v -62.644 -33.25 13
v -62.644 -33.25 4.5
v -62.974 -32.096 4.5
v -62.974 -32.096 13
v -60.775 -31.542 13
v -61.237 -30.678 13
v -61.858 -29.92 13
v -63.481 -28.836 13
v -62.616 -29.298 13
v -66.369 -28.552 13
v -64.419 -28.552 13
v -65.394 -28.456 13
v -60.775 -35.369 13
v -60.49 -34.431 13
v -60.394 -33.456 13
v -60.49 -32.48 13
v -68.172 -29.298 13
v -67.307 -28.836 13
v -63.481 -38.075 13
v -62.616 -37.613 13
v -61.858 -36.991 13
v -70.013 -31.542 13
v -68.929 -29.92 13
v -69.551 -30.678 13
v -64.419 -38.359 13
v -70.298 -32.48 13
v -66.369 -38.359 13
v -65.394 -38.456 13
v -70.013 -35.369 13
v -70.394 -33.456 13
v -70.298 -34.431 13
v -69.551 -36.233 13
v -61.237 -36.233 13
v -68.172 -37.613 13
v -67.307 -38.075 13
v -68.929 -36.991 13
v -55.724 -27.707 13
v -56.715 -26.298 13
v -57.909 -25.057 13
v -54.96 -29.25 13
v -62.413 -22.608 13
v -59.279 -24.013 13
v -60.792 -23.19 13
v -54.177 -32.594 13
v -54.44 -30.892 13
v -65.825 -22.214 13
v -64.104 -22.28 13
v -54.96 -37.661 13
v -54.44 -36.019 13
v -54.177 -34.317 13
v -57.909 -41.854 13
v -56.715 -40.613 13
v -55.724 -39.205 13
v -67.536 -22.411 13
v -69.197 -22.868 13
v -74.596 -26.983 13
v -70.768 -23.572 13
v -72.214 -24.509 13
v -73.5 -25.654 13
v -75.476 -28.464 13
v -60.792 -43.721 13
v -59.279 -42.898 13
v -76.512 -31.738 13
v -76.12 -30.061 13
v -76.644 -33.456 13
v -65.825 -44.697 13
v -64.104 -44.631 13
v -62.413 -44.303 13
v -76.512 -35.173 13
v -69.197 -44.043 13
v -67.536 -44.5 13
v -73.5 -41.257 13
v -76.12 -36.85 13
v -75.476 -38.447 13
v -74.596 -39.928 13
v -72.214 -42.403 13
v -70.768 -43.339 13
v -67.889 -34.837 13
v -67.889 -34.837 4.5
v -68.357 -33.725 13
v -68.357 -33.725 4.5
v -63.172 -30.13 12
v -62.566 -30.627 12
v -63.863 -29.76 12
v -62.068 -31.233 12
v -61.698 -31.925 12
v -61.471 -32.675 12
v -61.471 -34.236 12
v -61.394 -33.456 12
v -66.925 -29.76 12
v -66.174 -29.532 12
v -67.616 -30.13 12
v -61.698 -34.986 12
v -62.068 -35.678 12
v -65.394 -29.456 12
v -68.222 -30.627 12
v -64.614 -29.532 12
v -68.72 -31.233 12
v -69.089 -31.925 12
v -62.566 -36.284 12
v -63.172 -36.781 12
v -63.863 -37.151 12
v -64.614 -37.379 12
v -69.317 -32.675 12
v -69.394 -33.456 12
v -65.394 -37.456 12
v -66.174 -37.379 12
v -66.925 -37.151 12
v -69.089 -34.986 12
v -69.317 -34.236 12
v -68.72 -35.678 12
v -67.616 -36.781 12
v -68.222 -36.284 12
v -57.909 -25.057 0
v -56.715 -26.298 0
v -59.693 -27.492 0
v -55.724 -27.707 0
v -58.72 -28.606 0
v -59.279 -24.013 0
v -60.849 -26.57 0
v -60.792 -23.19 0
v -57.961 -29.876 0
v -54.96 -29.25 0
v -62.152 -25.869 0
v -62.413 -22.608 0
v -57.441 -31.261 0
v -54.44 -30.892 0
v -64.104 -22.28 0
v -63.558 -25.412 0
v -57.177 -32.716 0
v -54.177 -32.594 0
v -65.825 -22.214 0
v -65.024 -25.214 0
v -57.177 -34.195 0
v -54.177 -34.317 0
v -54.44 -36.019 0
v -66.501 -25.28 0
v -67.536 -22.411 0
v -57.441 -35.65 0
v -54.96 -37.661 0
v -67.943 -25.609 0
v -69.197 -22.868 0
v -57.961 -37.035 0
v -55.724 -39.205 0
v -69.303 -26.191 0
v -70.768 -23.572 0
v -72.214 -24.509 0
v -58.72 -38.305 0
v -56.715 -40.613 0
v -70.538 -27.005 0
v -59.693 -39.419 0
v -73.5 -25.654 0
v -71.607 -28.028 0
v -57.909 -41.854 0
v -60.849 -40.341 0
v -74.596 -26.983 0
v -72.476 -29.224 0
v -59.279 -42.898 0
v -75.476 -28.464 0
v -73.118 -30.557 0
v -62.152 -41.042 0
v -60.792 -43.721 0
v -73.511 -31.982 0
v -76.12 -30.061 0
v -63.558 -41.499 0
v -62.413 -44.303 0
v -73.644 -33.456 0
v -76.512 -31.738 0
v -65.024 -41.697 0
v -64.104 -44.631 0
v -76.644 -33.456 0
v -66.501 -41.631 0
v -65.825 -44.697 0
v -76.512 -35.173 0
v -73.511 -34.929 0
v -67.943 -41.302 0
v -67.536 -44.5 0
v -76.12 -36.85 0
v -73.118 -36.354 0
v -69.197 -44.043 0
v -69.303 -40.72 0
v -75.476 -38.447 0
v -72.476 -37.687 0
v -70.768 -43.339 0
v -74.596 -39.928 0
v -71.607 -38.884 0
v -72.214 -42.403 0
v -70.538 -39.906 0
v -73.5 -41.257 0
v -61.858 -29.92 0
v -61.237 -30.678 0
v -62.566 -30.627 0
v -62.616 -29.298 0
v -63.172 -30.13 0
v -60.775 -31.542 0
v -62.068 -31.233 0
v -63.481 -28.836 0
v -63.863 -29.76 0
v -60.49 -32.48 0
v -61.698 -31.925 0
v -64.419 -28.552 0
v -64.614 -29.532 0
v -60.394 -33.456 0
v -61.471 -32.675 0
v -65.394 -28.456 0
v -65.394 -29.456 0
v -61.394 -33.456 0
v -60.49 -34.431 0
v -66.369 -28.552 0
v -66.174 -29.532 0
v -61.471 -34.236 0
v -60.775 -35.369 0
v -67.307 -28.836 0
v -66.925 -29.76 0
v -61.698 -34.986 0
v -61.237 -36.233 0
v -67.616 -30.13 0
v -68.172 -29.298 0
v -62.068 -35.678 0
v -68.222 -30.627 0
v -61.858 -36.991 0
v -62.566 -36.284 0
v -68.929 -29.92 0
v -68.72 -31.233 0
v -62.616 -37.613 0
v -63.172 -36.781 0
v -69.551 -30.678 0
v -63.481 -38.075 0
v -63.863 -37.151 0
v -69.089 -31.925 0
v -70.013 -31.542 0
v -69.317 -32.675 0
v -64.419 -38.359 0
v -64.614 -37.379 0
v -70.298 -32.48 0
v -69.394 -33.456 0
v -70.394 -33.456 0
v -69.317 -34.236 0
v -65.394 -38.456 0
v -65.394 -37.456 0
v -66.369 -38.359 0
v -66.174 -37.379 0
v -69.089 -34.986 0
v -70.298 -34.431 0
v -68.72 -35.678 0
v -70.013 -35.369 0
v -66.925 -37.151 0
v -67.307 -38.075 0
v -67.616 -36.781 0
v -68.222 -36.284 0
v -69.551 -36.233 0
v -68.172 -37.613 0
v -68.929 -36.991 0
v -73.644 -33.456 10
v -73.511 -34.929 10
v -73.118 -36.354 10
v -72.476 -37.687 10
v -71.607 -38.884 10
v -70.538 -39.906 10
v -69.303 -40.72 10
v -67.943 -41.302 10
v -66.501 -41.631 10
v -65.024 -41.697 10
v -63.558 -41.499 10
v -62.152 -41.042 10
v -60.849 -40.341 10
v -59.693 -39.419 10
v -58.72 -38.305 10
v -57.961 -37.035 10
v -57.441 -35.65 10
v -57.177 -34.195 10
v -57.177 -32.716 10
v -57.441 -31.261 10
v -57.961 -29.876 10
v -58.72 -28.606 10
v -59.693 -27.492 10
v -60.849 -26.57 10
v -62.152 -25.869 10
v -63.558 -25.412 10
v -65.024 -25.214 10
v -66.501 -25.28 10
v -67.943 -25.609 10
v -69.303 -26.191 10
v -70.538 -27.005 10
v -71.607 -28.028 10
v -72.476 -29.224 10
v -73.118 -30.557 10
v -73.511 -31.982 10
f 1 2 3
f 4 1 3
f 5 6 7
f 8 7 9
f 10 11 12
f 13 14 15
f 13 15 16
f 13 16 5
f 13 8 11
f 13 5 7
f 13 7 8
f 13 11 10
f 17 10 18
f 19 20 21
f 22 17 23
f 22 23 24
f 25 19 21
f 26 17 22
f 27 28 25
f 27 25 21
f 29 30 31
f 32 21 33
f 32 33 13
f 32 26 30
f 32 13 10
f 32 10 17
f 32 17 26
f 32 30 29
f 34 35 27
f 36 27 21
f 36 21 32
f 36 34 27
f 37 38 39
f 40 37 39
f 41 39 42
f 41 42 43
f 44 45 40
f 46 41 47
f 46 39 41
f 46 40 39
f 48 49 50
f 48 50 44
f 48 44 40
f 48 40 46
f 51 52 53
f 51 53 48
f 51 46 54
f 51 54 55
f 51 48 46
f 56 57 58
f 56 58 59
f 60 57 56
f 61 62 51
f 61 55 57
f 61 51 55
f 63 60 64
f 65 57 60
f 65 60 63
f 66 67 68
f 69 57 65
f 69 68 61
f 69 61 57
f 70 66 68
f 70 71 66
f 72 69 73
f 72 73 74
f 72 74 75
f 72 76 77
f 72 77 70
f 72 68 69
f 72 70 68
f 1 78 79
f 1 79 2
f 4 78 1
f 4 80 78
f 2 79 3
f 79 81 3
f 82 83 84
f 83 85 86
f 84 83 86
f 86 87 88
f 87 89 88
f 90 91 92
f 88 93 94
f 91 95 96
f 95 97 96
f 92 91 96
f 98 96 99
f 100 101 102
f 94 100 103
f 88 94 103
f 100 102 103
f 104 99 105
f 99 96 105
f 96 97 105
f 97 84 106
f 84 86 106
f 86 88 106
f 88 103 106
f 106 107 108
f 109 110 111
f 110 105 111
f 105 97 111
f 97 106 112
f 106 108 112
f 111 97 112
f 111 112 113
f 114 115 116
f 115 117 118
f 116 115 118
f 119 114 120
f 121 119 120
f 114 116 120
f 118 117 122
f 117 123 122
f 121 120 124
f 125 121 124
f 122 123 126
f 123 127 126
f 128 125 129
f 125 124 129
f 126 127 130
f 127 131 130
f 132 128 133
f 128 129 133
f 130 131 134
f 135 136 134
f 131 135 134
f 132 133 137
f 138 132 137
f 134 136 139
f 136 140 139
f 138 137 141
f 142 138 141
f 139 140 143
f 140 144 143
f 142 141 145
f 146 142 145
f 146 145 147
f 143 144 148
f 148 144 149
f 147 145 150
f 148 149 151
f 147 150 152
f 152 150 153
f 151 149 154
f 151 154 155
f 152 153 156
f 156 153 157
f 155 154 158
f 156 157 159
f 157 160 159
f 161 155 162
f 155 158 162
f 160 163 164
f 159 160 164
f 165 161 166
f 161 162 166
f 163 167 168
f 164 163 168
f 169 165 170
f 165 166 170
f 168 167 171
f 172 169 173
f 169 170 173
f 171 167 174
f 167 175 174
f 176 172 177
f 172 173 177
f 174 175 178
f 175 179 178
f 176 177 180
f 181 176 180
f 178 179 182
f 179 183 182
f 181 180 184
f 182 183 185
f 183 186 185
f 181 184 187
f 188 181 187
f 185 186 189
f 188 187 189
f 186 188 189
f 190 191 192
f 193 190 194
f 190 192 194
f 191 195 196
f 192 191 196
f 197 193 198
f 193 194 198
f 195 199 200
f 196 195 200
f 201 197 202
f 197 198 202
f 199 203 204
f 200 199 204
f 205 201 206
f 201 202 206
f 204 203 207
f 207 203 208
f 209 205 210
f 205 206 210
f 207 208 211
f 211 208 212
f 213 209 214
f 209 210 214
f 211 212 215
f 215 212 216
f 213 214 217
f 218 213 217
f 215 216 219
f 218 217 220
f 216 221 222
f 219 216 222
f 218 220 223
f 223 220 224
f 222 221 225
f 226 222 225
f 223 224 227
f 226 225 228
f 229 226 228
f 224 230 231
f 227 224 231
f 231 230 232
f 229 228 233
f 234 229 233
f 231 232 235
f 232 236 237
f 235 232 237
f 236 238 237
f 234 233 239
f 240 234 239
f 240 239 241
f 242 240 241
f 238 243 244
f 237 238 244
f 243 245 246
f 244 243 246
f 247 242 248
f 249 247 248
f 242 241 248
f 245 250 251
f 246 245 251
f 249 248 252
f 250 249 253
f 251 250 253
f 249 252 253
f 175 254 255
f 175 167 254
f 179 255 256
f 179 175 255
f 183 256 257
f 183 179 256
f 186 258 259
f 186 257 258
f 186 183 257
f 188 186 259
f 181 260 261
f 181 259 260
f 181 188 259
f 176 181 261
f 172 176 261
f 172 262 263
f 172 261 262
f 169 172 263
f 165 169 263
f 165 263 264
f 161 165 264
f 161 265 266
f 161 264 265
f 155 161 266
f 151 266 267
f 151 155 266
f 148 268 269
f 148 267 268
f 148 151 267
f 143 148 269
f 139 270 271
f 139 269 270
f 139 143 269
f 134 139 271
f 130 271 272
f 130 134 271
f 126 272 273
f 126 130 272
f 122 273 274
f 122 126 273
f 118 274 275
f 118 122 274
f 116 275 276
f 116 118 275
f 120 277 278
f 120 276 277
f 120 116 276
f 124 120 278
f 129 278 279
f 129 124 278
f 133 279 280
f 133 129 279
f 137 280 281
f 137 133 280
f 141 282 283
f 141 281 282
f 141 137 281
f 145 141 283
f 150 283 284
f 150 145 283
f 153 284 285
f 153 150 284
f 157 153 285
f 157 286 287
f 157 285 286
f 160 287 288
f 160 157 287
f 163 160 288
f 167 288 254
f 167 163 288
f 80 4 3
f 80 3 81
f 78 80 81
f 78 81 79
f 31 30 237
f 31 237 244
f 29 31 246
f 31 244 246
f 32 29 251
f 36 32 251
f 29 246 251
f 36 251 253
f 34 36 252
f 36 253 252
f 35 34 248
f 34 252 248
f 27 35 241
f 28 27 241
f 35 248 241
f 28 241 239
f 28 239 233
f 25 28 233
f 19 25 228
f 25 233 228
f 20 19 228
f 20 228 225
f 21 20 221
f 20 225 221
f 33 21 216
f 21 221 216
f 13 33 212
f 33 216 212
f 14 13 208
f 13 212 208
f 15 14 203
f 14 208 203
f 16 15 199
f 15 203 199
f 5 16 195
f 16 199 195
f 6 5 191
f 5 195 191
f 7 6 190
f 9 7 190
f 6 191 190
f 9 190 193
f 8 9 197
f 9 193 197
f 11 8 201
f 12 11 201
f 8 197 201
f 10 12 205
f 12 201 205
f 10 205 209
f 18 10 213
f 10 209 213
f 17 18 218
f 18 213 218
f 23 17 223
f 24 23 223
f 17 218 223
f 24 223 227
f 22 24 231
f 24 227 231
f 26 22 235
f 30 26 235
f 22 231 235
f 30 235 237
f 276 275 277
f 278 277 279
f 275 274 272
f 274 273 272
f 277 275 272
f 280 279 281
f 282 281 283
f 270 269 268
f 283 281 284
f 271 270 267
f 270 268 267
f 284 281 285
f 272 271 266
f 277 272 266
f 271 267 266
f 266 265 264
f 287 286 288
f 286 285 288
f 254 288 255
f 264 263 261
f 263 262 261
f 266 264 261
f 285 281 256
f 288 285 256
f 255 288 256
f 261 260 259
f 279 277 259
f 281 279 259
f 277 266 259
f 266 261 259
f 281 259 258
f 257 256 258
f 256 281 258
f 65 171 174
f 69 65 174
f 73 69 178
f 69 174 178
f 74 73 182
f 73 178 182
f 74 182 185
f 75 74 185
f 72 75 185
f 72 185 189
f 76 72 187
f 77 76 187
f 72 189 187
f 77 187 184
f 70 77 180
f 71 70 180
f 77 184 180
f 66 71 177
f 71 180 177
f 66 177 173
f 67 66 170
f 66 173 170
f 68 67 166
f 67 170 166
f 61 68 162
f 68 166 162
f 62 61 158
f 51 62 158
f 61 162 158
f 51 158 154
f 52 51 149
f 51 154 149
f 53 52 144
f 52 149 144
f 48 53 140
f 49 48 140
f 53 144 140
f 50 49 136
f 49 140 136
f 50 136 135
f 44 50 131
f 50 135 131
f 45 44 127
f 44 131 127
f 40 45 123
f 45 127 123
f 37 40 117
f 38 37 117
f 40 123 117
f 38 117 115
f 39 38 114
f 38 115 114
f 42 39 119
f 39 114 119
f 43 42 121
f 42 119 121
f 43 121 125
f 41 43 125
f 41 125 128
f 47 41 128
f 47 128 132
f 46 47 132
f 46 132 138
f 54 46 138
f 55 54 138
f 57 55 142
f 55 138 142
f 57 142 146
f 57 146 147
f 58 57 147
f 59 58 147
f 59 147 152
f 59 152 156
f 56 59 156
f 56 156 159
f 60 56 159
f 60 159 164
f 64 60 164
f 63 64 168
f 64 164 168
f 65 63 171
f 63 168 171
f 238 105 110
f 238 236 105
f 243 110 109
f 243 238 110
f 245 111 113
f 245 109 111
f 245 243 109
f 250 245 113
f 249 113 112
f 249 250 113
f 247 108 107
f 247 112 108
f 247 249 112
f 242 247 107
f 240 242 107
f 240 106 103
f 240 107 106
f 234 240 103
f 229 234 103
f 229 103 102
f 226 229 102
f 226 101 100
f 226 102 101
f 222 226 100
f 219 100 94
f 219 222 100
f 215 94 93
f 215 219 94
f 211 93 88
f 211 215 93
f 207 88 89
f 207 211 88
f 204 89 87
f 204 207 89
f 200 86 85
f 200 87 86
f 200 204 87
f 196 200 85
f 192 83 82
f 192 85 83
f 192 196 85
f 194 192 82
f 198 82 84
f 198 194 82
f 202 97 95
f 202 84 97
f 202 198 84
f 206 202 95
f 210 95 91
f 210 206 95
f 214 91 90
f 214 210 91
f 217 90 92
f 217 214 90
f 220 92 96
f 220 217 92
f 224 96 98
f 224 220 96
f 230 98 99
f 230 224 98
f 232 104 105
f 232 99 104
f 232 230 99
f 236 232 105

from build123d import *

# Parameters (mm, degrees)
SKETCH1_R           = 11.25
BOSS_EXTRUDE1_DEPTH = 13
SHELL1_T            = -3
SKETCH2_R           = 5
BOSS_EXTRUDE2_DEPTH = 13
SHELL2_T            = -1
BOSS_EXTRUDE3_DEPTH = 8.5


with BuildPart() as part:
    # Sketch1 → Boss-Extrude1 (new body)
    with BuildSketch(Plane.XY):
        with Locations(Location((-65.393963614, -33.455551364, 0), (0, 0, 180))):
            Circle(SKETCH1_R)
    extrude(amount=BOSS_EXTRUDE1_DEPTH)

    # Shell1
    shell1_openings = [part.faces().sort_by_distance(p)[0] for p in [
        (-65.393963614, -33.455551364, 0),
    ]]
    offset(amount=SHELL1_T, openings=shell1_openings, kind=Kind.INTERSECTION)


with BuildPart() as body_2:
    # Sketch2 → Boss-Extrude2 (new body)
    with BuildSketch(Plane.XY):
        with Locations(Location((-65.393963614, -33.455551364, 0), (0, 0, 180))):
            Circle(SKETCH2_R)
    extrude(amount=BOSS_EXTRUDE2_DEPTH)

    # Shell2
    shell2_openings = [body_2.faces().sort_by_distance(p)[0] for p in [
        (-65.393963614, -33.455551364, 0),
    ]]
    offset(amount=SHELL2_T, openings=shell2_openings, kind=Kind.INTERSECTION)


with BuildPart() as body_3:
    # Sketch4 → Boss-Extrude3 (new body)
    with BuildSketch(Plane.XY.offset(13)):
        Polygon((-67.888605191, -34.837324501), (-62.643736407, -33.250175785), (-62.973774004, -32.096308122), (-68.356811049, -33.725267908), align=None)
    extrude(amount=-BOSS_EXTRUDE3_DEPTH)


solid = Compound([part.part, body_2.part, body_3.part])
